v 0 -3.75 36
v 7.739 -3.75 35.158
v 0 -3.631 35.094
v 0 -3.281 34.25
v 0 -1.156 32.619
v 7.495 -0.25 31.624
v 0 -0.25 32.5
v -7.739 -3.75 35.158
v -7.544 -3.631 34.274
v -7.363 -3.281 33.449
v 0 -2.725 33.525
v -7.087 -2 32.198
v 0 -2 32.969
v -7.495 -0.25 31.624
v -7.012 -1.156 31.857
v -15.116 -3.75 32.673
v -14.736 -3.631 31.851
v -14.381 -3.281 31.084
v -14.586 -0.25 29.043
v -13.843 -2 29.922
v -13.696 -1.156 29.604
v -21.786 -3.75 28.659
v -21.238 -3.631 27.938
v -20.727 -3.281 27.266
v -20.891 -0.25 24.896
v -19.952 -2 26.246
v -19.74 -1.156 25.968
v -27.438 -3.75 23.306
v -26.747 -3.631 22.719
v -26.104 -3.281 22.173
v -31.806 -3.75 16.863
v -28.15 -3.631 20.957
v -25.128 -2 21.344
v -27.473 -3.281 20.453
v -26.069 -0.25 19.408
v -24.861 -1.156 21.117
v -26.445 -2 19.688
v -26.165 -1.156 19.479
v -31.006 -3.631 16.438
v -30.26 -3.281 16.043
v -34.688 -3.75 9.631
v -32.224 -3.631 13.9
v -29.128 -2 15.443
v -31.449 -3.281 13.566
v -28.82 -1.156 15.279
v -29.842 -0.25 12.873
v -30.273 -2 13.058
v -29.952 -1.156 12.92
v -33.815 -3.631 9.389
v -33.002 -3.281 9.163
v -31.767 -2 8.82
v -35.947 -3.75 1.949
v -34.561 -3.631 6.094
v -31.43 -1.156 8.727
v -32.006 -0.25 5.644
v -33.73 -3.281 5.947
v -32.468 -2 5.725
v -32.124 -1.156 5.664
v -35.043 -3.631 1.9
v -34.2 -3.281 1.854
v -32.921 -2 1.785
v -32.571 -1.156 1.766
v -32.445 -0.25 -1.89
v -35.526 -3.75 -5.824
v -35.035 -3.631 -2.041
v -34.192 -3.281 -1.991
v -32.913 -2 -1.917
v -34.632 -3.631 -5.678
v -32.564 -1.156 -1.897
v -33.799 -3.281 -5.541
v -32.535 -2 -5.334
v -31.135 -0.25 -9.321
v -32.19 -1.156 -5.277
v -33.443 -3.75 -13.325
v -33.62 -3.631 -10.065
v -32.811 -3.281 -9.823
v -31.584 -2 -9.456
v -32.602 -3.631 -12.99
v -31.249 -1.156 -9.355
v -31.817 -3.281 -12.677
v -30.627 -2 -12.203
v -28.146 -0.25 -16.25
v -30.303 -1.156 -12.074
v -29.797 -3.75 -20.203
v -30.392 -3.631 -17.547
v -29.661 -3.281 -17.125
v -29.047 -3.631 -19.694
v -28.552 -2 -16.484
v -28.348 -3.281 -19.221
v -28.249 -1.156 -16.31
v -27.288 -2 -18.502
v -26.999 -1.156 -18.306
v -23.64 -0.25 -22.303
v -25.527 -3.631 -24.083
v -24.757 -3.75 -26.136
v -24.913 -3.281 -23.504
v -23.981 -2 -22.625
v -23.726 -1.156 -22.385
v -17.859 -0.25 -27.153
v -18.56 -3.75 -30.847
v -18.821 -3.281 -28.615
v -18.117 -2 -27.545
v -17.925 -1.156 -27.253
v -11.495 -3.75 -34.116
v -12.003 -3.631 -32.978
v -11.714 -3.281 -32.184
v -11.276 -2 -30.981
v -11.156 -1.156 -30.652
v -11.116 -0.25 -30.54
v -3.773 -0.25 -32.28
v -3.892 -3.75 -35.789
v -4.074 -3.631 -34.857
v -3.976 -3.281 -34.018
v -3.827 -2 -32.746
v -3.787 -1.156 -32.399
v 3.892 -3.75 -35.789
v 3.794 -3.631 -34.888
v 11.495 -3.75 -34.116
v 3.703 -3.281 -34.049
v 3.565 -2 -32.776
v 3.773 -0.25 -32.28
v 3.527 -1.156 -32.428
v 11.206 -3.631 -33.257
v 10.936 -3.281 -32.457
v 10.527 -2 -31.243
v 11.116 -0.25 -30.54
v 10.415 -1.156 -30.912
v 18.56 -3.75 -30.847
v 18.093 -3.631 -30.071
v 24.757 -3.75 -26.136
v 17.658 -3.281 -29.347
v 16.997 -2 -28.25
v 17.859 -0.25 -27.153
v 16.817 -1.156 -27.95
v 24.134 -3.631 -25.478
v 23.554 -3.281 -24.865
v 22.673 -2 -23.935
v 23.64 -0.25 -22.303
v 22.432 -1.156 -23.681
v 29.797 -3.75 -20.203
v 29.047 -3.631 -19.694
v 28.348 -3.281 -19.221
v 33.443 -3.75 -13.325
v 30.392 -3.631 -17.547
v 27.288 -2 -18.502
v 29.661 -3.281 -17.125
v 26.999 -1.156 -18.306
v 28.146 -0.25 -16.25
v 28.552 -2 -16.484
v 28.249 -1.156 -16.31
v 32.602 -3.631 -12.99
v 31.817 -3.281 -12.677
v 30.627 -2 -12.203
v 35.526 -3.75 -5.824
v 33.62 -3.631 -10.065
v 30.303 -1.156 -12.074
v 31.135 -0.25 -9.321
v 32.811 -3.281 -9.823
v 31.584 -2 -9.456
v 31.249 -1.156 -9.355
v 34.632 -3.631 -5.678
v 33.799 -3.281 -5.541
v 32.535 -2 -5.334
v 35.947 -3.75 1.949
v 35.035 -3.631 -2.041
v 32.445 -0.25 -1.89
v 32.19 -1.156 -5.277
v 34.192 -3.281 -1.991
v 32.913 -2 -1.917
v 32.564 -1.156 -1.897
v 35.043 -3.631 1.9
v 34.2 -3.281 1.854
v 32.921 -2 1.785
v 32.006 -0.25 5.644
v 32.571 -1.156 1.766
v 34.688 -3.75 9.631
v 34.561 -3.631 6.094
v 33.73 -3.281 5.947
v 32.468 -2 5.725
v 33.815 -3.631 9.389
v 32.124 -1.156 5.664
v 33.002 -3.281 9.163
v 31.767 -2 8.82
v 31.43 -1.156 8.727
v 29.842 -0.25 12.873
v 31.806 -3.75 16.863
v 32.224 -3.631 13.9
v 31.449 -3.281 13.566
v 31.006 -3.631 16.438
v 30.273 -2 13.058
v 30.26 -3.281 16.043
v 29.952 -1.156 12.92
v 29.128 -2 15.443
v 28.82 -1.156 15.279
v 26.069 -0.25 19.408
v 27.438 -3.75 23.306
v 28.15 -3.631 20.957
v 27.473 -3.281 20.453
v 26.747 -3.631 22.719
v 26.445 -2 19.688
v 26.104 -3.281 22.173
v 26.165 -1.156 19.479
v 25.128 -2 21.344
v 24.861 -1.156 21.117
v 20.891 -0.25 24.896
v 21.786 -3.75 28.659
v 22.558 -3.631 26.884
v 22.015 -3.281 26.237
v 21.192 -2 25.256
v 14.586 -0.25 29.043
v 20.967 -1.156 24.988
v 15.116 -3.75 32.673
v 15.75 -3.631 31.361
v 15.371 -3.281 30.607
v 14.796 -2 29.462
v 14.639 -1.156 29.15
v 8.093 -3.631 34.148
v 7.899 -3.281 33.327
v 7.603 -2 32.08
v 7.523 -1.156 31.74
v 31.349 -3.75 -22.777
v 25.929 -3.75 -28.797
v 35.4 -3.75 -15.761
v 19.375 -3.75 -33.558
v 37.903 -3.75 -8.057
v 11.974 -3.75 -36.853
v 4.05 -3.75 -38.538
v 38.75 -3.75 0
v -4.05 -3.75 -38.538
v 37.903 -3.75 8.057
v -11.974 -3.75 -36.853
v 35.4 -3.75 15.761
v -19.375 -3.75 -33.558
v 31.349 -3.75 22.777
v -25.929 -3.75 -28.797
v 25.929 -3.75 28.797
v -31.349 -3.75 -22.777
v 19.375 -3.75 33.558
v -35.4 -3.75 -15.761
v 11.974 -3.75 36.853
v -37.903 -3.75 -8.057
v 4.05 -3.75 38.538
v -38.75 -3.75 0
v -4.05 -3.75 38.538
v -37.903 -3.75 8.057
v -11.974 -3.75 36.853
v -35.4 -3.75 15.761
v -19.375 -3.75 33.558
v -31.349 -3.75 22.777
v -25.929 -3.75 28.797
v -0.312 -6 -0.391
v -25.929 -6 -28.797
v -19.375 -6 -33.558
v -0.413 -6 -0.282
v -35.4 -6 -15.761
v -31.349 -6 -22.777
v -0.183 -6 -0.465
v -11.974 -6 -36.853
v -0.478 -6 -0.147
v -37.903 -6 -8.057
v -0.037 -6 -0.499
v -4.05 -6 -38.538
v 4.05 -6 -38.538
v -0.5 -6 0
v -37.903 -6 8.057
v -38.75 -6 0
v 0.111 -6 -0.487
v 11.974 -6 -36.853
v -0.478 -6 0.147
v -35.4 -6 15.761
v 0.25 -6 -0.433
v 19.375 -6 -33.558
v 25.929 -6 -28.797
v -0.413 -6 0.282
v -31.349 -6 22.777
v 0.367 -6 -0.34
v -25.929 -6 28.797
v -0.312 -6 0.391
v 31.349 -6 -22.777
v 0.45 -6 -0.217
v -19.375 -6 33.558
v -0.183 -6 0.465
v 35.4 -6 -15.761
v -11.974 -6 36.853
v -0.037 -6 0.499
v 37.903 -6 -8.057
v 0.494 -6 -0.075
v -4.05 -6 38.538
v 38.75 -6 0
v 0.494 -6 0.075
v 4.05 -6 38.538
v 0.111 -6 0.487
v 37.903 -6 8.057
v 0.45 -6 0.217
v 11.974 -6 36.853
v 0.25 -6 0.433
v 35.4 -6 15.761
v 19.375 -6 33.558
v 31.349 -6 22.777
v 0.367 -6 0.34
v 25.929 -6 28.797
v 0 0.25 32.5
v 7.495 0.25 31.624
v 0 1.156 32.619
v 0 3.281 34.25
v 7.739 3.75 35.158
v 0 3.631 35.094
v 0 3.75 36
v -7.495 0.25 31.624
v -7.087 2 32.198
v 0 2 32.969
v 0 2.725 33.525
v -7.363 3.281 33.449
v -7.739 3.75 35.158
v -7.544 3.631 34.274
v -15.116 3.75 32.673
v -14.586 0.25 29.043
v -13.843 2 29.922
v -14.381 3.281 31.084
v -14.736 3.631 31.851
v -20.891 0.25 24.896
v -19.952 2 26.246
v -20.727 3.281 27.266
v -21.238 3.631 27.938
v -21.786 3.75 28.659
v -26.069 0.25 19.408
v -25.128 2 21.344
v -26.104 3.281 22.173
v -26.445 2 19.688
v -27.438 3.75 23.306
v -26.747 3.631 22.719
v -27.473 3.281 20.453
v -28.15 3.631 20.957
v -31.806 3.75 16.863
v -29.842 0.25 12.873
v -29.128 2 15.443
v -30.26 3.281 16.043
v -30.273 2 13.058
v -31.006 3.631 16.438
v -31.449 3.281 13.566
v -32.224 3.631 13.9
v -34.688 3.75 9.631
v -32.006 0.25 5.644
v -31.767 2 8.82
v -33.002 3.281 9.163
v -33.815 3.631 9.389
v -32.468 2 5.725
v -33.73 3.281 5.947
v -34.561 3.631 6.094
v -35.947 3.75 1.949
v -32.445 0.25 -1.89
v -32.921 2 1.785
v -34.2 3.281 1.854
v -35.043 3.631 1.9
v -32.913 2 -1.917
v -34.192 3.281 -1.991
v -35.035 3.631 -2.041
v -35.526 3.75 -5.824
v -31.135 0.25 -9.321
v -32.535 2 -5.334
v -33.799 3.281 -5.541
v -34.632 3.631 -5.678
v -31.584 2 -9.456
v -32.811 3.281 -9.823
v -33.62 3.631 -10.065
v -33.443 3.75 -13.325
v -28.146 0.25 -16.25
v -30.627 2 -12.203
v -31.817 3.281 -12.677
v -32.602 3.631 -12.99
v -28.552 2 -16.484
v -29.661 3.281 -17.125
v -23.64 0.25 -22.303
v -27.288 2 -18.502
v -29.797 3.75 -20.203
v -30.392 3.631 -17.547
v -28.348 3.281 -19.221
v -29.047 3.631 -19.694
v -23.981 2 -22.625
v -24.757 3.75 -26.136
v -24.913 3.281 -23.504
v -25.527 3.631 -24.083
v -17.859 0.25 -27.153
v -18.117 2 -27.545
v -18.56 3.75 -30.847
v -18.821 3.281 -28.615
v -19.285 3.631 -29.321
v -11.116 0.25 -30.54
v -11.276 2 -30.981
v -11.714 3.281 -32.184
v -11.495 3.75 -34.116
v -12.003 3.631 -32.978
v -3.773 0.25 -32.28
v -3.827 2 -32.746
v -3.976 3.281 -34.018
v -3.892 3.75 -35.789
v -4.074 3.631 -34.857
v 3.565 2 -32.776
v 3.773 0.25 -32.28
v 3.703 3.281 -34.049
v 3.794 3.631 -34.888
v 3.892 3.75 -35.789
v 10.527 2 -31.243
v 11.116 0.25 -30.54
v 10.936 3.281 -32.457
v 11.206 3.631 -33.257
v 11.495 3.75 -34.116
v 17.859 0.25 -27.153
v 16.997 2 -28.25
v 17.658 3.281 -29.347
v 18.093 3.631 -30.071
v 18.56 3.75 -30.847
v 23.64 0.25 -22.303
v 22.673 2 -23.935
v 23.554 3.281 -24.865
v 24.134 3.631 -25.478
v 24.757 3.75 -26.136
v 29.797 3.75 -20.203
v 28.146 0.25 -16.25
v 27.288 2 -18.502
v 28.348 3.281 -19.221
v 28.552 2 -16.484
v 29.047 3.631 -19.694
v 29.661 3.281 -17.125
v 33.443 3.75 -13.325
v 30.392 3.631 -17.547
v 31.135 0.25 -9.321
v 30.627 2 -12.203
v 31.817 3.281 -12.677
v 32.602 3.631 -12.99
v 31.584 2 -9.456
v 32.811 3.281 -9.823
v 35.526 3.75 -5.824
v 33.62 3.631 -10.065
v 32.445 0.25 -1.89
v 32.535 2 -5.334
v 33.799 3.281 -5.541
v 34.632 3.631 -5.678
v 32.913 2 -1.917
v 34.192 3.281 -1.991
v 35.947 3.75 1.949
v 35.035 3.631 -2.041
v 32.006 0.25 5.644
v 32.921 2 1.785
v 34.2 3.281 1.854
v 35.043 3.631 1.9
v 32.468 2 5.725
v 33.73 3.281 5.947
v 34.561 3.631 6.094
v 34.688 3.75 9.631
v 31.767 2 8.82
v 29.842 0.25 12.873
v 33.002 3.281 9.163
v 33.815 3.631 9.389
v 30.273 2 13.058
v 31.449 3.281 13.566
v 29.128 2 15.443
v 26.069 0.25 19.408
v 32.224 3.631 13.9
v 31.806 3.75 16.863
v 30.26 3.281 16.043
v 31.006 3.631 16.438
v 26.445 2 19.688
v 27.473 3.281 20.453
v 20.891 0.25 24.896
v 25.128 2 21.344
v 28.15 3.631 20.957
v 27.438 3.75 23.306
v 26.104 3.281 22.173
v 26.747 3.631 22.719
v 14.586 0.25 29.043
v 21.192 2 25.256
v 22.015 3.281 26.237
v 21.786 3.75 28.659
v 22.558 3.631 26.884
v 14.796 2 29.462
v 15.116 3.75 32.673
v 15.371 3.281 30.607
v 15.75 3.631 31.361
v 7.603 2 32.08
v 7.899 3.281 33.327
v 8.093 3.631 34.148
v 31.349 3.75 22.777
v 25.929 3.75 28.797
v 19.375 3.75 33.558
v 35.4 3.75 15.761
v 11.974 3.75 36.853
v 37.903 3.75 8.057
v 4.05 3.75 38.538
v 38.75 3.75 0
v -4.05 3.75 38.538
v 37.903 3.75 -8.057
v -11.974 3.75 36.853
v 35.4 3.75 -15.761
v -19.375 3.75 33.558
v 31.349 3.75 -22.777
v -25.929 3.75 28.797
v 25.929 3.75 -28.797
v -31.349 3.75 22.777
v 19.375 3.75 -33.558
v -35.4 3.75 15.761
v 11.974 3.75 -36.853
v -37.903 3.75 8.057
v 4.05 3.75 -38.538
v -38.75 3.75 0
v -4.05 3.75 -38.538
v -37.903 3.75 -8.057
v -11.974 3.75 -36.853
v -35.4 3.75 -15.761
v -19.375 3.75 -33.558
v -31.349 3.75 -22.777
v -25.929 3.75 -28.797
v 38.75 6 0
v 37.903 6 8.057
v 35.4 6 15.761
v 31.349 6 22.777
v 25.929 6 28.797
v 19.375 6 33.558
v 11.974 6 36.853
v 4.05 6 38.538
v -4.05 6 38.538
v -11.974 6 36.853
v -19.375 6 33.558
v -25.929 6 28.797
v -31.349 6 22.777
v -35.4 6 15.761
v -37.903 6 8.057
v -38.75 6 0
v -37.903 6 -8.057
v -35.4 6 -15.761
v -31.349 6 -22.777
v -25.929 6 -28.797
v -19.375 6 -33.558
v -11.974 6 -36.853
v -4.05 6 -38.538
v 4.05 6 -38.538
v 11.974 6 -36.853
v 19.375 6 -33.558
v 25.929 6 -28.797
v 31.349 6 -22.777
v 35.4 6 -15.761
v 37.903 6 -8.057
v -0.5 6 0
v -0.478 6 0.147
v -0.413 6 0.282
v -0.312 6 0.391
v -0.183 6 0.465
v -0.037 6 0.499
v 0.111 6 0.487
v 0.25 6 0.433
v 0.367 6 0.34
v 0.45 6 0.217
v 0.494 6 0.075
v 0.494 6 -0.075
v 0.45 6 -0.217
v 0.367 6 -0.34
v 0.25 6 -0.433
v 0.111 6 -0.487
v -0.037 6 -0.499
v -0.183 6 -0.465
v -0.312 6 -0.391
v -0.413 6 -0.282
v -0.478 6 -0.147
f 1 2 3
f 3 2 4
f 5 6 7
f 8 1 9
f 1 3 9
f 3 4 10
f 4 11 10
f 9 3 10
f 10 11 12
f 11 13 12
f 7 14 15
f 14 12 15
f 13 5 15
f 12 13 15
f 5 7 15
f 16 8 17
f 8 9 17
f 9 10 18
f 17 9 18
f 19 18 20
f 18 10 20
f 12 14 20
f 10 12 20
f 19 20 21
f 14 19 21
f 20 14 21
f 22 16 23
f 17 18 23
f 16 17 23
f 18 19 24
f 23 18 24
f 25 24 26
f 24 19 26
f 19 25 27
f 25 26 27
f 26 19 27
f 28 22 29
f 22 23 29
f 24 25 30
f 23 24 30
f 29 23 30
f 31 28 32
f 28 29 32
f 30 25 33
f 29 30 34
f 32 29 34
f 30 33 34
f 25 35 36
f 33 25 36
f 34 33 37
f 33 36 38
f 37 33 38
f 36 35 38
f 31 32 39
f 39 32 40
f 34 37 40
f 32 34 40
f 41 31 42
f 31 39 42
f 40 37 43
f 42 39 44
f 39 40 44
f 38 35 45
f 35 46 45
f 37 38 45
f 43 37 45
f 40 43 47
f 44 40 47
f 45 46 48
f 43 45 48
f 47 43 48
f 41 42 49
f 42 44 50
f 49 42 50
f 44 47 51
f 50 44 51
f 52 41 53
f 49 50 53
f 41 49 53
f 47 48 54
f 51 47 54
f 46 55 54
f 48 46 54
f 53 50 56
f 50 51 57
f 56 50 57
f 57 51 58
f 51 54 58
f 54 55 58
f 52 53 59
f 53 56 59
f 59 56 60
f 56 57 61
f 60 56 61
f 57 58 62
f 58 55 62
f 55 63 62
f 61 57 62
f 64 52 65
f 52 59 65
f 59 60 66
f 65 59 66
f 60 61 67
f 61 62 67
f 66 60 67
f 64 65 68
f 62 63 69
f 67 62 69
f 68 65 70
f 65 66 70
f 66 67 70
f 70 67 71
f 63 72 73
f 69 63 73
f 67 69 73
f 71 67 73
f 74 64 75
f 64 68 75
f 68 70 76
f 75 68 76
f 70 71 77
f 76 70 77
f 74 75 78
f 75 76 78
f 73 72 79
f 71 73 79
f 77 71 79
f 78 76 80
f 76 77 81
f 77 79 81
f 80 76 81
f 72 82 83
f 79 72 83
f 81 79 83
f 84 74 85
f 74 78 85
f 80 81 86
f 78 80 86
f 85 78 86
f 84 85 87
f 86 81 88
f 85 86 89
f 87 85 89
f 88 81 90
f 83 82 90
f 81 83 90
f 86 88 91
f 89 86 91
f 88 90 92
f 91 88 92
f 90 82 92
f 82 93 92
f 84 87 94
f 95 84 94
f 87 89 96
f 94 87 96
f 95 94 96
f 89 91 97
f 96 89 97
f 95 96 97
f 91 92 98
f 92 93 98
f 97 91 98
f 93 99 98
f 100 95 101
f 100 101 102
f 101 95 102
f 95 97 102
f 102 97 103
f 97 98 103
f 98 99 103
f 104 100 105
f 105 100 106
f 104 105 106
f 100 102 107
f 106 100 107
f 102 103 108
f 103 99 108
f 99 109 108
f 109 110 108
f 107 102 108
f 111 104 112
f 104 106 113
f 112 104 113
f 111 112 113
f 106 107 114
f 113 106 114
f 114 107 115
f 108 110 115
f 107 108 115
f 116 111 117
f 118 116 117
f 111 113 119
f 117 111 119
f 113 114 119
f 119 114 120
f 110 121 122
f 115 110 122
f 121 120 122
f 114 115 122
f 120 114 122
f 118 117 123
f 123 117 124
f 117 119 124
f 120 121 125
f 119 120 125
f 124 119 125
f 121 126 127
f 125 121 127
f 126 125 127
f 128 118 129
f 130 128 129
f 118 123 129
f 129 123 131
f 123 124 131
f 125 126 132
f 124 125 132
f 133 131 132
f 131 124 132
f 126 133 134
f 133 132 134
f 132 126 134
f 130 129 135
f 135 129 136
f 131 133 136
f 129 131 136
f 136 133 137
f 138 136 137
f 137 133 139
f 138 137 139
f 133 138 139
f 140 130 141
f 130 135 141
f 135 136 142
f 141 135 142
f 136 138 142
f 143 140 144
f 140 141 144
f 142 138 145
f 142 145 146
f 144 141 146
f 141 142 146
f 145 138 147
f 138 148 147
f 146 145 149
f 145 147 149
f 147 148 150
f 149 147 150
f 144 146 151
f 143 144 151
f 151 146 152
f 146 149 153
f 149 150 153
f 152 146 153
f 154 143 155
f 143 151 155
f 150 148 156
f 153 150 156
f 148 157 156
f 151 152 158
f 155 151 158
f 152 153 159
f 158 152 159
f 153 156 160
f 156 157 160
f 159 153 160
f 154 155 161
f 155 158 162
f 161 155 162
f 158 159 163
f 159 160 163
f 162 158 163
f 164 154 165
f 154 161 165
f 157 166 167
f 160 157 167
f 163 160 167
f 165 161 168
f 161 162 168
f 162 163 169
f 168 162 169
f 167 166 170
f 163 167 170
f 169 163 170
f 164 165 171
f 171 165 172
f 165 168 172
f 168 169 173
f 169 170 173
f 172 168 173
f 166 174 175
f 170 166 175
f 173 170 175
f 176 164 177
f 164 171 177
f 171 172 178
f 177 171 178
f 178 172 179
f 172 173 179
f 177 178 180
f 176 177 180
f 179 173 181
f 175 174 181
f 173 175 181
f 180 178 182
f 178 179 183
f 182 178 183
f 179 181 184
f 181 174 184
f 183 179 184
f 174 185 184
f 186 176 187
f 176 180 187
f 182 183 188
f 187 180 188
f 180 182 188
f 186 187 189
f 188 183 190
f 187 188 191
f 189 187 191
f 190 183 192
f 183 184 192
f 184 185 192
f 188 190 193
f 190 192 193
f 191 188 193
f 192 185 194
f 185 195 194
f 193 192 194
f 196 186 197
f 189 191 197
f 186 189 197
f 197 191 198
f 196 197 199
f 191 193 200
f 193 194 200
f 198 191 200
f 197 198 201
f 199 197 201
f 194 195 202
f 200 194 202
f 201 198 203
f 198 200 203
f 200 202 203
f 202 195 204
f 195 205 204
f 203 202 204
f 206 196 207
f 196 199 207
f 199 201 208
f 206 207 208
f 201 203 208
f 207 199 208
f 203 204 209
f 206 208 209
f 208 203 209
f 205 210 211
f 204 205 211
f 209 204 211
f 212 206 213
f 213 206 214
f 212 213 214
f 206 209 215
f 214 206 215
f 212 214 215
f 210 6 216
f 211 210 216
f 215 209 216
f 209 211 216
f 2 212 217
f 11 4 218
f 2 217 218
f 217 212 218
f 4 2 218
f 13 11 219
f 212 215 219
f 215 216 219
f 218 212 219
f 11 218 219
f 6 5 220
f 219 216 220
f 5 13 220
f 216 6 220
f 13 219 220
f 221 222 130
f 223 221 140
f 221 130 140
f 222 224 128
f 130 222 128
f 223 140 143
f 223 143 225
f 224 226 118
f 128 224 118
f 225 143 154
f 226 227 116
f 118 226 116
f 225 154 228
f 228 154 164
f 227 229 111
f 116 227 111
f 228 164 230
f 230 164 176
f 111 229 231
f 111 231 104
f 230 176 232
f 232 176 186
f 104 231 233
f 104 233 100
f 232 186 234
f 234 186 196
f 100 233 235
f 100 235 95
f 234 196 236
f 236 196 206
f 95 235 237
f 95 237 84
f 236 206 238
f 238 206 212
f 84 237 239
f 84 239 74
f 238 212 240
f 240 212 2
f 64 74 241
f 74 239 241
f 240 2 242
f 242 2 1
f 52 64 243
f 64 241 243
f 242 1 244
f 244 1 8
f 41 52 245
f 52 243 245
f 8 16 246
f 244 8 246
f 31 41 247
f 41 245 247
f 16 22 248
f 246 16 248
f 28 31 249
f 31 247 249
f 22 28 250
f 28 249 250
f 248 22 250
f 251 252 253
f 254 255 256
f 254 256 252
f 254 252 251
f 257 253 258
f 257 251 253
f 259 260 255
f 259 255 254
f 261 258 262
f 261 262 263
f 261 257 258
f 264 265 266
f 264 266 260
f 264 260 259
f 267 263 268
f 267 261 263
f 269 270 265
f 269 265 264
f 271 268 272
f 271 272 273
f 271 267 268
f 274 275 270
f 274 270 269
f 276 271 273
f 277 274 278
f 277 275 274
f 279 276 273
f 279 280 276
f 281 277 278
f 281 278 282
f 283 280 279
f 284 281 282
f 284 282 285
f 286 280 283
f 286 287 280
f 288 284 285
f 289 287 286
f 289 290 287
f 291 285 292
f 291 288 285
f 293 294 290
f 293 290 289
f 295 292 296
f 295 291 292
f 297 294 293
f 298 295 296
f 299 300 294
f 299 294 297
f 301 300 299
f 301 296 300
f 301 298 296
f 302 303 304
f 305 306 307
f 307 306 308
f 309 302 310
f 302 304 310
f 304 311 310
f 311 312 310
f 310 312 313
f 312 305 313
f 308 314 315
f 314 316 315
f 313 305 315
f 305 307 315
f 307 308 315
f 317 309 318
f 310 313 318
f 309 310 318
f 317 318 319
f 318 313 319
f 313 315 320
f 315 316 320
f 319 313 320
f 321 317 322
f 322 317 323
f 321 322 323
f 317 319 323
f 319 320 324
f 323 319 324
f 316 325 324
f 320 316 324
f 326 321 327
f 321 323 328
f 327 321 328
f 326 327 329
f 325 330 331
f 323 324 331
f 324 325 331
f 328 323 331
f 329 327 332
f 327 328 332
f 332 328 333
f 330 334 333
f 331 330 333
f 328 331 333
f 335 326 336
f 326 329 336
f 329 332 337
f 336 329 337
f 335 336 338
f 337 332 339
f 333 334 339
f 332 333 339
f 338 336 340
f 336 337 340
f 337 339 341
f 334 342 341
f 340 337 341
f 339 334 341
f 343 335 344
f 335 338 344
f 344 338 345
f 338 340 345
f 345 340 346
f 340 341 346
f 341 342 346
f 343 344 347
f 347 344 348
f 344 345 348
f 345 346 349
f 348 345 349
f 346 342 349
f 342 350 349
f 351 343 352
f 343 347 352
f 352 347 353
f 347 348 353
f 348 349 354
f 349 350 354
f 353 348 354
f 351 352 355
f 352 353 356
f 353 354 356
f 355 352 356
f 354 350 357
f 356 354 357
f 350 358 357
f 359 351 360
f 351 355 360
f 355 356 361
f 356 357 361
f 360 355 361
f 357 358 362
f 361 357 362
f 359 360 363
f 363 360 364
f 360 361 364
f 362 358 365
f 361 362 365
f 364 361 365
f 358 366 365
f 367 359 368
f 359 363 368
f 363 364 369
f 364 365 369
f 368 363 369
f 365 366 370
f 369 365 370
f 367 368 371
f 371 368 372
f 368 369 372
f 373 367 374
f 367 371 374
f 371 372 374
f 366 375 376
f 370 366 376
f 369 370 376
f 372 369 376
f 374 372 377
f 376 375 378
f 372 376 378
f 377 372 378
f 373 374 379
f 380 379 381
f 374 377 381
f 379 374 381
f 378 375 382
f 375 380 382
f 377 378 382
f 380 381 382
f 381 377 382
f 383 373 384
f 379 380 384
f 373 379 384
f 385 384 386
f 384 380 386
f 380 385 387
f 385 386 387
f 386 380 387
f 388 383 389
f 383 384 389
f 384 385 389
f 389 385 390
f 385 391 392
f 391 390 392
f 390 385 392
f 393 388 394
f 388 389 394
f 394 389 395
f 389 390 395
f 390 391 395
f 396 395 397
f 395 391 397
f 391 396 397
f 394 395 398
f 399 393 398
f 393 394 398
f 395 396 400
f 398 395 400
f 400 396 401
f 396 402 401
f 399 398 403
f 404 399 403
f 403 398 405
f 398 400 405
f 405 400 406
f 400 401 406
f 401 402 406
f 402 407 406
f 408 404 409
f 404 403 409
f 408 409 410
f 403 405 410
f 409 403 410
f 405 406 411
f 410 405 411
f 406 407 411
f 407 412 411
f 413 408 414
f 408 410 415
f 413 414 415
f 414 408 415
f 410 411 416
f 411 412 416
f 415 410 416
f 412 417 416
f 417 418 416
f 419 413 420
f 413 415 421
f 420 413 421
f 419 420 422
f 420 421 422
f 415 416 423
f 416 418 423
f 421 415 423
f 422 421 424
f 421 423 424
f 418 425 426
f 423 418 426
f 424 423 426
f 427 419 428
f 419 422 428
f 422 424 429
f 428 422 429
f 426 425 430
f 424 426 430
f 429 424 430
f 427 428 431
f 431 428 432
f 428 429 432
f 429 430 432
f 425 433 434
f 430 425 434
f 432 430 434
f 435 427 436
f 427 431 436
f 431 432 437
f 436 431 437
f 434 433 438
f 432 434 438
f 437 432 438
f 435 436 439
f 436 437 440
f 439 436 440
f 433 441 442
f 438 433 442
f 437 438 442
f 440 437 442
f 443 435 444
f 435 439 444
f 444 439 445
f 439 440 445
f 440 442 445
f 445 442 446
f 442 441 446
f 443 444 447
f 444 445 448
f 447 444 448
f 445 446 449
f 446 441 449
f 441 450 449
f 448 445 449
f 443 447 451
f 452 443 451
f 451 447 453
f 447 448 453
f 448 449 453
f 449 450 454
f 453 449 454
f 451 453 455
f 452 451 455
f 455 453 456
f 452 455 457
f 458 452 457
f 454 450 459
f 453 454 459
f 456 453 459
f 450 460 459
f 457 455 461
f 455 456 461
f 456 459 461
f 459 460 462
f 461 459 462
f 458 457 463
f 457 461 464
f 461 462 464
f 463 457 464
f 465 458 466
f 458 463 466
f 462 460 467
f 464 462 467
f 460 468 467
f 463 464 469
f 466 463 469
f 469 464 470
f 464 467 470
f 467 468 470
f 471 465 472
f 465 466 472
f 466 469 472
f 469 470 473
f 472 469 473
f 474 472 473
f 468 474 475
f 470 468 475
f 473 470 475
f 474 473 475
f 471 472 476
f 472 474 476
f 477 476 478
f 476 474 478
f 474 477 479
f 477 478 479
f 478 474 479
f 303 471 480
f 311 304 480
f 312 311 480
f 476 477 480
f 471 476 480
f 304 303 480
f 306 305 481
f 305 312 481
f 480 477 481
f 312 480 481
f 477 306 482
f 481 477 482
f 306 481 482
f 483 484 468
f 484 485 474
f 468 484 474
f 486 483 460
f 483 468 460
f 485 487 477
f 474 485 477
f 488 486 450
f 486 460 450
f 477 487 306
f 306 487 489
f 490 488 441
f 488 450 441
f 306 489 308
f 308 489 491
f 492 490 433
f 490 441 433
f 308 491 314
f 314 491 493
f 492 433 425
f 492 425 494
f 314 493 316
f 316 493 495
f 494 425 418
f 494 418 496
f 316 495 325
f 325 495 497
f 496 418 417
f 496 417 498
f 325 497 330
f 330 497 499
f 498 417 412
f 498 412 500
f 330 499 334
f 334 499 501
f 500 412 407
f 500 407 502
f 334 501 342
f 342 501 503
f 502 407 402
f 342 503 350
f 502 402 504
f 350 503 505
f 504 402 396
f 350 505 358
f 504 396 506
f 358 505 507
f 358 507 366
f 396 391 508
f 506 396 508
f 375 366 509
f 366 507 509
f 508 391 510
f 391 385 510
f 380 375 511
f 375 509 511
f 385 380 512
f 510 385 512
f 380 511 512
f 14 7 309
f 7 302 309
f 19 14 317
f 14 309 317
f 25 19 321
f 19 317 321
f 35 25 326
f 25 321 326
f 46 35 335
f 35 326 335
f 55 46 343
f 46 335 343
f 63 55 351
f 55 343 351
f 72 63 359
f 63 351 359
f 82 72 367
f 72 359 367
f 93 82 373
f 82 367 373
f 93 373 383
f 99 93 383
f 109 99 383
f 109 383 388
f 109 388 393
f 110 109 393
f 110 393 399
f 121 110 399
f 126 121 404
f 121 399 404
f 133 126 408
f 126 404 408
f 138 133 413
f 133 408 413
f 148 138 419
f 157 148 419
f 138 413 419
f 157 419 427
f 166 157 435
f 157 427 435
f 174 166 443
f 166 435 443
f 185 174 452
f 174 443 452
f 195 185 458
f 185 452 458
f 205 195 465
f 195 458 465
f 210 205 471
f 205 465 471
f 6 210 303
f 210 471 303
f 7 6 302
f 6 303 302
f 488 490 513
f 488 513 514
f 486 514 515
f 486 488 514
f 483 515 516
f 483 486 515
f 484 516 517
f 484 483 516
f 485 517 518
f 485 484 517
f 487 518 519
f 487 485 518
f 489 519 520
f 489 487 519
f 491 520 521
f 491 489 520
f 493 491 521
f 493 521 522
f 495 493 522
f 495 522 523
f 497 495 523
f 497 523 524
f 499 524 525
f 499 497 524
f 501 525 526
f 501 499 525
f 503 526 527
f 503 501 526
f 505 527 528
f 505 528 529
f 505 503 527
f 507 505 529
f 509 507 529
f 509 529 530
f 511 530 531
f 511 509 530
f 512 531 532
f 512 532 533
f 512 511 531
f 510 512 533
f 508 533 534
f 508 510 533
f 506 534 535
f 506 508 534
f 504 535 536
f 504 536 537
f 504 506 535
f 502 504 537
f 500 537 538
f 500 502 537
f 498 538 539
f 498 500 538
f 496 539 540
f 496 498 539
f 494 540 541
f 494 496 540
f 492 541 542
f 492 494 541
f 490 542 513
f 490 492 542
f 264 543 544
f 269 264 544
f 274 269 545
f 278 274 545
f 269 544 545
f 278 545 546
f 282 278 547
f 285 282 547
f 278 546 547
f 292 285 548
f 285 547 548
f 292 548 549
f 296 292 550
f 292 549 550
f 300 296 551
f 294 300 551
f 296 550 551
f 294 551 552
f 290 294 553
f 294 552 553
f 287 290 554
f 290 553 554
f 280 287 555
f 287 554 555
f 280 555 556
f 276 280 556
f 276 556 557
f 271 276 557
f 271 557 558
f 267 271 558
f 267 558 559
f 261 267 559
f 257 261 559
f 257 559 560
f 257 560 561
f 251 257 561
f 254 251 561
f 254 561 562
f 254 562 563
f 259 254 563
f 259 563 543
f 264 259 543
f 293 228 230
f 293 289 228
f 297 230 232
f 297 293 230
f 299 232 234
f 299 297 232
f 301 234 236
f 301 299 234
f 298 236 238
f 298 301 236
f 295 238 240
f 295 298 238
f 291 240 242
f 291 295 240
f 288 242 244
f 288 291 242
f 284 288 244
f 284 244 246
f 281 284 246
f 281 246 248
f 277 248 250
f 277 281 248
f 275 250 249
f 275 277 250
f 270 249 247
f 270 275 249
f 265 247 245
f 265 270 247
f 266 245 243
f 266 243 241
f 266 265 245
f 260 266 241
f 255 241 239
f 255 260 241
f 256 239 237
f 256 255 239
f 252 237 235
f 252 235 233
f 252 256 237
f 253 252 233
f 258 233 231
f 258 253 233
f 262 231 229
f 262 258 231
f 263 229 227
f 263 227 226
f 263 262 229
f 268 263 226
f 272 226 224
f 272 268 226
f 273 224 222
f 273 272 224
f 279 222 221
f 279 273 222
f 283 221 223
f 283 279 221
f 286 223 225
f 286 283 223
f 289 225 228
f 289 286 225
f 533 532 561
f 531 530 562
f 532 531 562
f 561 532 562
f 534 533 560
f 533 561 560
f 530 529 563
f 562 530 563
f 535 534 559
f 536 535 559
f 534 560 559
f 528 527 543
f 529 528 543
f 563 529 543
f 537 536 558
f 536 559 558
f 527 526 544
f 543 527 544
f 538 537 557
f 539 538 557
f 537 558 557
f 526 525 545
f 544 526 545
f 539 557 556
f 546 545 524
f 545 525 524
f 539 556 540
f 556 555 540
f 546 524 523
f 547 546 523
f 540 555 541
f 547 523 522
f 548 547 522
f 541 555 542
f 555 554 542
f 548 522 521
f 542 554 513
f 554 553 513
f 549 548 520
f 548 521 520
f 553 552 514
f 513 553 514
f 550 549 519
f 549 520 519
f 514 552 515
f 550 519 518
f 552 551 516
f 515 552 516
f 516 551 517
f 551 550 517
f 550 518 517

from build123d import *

# Parameters (mm, degrees)
F0_R     = 38.75
F1_DEPTH = 6
F5_R     = 0.5
F6_DEPTH = 12.001


with BuildPart() as f1:
    # F0 (on Front) → F1 (new body, symmetric)
    with BuildSketch(Plane.XZ):
        Circle(F0_R)
    extrude(amount=F1_DEPTH, both=True)

    # F2 (on Right) → F4 (revolve, cut)
    with BuildSketch(Plane.YZ):
        with BuildLine():
            Line((3.75, 36), (3.75, 40))
            Line((3.75, 40), (-3.75, 40))
            Line((-3.75, 40), (-3.75, 36))
            ThreePointArc((-3.75, 36), (-2.724874, 33.525126), (-0.25, 32.5))
            Line((-0.25, 32.5), (0.25, 32.5))
            ThreePointArc((0.25, 32.5), (2.724874, 33.525126), (3.75, 36))
        make_face()
    revolve(axis=Axis((0, -2.011297, 0), (0, -1, 0)), mode=Mode.SUBTRACT)

    # F5 (on face) → F6 (cut, through all)
    with BuildSketch(Plane(origin=(0, 6, 0), x_dir=(-1, 0, 0), z_dir=(0, 1, 0))):
        Circle(F5_R)
    extrude(amount=-F6_DEPTH, mode=Mode.SUBTRACT)


solid = f1.part
